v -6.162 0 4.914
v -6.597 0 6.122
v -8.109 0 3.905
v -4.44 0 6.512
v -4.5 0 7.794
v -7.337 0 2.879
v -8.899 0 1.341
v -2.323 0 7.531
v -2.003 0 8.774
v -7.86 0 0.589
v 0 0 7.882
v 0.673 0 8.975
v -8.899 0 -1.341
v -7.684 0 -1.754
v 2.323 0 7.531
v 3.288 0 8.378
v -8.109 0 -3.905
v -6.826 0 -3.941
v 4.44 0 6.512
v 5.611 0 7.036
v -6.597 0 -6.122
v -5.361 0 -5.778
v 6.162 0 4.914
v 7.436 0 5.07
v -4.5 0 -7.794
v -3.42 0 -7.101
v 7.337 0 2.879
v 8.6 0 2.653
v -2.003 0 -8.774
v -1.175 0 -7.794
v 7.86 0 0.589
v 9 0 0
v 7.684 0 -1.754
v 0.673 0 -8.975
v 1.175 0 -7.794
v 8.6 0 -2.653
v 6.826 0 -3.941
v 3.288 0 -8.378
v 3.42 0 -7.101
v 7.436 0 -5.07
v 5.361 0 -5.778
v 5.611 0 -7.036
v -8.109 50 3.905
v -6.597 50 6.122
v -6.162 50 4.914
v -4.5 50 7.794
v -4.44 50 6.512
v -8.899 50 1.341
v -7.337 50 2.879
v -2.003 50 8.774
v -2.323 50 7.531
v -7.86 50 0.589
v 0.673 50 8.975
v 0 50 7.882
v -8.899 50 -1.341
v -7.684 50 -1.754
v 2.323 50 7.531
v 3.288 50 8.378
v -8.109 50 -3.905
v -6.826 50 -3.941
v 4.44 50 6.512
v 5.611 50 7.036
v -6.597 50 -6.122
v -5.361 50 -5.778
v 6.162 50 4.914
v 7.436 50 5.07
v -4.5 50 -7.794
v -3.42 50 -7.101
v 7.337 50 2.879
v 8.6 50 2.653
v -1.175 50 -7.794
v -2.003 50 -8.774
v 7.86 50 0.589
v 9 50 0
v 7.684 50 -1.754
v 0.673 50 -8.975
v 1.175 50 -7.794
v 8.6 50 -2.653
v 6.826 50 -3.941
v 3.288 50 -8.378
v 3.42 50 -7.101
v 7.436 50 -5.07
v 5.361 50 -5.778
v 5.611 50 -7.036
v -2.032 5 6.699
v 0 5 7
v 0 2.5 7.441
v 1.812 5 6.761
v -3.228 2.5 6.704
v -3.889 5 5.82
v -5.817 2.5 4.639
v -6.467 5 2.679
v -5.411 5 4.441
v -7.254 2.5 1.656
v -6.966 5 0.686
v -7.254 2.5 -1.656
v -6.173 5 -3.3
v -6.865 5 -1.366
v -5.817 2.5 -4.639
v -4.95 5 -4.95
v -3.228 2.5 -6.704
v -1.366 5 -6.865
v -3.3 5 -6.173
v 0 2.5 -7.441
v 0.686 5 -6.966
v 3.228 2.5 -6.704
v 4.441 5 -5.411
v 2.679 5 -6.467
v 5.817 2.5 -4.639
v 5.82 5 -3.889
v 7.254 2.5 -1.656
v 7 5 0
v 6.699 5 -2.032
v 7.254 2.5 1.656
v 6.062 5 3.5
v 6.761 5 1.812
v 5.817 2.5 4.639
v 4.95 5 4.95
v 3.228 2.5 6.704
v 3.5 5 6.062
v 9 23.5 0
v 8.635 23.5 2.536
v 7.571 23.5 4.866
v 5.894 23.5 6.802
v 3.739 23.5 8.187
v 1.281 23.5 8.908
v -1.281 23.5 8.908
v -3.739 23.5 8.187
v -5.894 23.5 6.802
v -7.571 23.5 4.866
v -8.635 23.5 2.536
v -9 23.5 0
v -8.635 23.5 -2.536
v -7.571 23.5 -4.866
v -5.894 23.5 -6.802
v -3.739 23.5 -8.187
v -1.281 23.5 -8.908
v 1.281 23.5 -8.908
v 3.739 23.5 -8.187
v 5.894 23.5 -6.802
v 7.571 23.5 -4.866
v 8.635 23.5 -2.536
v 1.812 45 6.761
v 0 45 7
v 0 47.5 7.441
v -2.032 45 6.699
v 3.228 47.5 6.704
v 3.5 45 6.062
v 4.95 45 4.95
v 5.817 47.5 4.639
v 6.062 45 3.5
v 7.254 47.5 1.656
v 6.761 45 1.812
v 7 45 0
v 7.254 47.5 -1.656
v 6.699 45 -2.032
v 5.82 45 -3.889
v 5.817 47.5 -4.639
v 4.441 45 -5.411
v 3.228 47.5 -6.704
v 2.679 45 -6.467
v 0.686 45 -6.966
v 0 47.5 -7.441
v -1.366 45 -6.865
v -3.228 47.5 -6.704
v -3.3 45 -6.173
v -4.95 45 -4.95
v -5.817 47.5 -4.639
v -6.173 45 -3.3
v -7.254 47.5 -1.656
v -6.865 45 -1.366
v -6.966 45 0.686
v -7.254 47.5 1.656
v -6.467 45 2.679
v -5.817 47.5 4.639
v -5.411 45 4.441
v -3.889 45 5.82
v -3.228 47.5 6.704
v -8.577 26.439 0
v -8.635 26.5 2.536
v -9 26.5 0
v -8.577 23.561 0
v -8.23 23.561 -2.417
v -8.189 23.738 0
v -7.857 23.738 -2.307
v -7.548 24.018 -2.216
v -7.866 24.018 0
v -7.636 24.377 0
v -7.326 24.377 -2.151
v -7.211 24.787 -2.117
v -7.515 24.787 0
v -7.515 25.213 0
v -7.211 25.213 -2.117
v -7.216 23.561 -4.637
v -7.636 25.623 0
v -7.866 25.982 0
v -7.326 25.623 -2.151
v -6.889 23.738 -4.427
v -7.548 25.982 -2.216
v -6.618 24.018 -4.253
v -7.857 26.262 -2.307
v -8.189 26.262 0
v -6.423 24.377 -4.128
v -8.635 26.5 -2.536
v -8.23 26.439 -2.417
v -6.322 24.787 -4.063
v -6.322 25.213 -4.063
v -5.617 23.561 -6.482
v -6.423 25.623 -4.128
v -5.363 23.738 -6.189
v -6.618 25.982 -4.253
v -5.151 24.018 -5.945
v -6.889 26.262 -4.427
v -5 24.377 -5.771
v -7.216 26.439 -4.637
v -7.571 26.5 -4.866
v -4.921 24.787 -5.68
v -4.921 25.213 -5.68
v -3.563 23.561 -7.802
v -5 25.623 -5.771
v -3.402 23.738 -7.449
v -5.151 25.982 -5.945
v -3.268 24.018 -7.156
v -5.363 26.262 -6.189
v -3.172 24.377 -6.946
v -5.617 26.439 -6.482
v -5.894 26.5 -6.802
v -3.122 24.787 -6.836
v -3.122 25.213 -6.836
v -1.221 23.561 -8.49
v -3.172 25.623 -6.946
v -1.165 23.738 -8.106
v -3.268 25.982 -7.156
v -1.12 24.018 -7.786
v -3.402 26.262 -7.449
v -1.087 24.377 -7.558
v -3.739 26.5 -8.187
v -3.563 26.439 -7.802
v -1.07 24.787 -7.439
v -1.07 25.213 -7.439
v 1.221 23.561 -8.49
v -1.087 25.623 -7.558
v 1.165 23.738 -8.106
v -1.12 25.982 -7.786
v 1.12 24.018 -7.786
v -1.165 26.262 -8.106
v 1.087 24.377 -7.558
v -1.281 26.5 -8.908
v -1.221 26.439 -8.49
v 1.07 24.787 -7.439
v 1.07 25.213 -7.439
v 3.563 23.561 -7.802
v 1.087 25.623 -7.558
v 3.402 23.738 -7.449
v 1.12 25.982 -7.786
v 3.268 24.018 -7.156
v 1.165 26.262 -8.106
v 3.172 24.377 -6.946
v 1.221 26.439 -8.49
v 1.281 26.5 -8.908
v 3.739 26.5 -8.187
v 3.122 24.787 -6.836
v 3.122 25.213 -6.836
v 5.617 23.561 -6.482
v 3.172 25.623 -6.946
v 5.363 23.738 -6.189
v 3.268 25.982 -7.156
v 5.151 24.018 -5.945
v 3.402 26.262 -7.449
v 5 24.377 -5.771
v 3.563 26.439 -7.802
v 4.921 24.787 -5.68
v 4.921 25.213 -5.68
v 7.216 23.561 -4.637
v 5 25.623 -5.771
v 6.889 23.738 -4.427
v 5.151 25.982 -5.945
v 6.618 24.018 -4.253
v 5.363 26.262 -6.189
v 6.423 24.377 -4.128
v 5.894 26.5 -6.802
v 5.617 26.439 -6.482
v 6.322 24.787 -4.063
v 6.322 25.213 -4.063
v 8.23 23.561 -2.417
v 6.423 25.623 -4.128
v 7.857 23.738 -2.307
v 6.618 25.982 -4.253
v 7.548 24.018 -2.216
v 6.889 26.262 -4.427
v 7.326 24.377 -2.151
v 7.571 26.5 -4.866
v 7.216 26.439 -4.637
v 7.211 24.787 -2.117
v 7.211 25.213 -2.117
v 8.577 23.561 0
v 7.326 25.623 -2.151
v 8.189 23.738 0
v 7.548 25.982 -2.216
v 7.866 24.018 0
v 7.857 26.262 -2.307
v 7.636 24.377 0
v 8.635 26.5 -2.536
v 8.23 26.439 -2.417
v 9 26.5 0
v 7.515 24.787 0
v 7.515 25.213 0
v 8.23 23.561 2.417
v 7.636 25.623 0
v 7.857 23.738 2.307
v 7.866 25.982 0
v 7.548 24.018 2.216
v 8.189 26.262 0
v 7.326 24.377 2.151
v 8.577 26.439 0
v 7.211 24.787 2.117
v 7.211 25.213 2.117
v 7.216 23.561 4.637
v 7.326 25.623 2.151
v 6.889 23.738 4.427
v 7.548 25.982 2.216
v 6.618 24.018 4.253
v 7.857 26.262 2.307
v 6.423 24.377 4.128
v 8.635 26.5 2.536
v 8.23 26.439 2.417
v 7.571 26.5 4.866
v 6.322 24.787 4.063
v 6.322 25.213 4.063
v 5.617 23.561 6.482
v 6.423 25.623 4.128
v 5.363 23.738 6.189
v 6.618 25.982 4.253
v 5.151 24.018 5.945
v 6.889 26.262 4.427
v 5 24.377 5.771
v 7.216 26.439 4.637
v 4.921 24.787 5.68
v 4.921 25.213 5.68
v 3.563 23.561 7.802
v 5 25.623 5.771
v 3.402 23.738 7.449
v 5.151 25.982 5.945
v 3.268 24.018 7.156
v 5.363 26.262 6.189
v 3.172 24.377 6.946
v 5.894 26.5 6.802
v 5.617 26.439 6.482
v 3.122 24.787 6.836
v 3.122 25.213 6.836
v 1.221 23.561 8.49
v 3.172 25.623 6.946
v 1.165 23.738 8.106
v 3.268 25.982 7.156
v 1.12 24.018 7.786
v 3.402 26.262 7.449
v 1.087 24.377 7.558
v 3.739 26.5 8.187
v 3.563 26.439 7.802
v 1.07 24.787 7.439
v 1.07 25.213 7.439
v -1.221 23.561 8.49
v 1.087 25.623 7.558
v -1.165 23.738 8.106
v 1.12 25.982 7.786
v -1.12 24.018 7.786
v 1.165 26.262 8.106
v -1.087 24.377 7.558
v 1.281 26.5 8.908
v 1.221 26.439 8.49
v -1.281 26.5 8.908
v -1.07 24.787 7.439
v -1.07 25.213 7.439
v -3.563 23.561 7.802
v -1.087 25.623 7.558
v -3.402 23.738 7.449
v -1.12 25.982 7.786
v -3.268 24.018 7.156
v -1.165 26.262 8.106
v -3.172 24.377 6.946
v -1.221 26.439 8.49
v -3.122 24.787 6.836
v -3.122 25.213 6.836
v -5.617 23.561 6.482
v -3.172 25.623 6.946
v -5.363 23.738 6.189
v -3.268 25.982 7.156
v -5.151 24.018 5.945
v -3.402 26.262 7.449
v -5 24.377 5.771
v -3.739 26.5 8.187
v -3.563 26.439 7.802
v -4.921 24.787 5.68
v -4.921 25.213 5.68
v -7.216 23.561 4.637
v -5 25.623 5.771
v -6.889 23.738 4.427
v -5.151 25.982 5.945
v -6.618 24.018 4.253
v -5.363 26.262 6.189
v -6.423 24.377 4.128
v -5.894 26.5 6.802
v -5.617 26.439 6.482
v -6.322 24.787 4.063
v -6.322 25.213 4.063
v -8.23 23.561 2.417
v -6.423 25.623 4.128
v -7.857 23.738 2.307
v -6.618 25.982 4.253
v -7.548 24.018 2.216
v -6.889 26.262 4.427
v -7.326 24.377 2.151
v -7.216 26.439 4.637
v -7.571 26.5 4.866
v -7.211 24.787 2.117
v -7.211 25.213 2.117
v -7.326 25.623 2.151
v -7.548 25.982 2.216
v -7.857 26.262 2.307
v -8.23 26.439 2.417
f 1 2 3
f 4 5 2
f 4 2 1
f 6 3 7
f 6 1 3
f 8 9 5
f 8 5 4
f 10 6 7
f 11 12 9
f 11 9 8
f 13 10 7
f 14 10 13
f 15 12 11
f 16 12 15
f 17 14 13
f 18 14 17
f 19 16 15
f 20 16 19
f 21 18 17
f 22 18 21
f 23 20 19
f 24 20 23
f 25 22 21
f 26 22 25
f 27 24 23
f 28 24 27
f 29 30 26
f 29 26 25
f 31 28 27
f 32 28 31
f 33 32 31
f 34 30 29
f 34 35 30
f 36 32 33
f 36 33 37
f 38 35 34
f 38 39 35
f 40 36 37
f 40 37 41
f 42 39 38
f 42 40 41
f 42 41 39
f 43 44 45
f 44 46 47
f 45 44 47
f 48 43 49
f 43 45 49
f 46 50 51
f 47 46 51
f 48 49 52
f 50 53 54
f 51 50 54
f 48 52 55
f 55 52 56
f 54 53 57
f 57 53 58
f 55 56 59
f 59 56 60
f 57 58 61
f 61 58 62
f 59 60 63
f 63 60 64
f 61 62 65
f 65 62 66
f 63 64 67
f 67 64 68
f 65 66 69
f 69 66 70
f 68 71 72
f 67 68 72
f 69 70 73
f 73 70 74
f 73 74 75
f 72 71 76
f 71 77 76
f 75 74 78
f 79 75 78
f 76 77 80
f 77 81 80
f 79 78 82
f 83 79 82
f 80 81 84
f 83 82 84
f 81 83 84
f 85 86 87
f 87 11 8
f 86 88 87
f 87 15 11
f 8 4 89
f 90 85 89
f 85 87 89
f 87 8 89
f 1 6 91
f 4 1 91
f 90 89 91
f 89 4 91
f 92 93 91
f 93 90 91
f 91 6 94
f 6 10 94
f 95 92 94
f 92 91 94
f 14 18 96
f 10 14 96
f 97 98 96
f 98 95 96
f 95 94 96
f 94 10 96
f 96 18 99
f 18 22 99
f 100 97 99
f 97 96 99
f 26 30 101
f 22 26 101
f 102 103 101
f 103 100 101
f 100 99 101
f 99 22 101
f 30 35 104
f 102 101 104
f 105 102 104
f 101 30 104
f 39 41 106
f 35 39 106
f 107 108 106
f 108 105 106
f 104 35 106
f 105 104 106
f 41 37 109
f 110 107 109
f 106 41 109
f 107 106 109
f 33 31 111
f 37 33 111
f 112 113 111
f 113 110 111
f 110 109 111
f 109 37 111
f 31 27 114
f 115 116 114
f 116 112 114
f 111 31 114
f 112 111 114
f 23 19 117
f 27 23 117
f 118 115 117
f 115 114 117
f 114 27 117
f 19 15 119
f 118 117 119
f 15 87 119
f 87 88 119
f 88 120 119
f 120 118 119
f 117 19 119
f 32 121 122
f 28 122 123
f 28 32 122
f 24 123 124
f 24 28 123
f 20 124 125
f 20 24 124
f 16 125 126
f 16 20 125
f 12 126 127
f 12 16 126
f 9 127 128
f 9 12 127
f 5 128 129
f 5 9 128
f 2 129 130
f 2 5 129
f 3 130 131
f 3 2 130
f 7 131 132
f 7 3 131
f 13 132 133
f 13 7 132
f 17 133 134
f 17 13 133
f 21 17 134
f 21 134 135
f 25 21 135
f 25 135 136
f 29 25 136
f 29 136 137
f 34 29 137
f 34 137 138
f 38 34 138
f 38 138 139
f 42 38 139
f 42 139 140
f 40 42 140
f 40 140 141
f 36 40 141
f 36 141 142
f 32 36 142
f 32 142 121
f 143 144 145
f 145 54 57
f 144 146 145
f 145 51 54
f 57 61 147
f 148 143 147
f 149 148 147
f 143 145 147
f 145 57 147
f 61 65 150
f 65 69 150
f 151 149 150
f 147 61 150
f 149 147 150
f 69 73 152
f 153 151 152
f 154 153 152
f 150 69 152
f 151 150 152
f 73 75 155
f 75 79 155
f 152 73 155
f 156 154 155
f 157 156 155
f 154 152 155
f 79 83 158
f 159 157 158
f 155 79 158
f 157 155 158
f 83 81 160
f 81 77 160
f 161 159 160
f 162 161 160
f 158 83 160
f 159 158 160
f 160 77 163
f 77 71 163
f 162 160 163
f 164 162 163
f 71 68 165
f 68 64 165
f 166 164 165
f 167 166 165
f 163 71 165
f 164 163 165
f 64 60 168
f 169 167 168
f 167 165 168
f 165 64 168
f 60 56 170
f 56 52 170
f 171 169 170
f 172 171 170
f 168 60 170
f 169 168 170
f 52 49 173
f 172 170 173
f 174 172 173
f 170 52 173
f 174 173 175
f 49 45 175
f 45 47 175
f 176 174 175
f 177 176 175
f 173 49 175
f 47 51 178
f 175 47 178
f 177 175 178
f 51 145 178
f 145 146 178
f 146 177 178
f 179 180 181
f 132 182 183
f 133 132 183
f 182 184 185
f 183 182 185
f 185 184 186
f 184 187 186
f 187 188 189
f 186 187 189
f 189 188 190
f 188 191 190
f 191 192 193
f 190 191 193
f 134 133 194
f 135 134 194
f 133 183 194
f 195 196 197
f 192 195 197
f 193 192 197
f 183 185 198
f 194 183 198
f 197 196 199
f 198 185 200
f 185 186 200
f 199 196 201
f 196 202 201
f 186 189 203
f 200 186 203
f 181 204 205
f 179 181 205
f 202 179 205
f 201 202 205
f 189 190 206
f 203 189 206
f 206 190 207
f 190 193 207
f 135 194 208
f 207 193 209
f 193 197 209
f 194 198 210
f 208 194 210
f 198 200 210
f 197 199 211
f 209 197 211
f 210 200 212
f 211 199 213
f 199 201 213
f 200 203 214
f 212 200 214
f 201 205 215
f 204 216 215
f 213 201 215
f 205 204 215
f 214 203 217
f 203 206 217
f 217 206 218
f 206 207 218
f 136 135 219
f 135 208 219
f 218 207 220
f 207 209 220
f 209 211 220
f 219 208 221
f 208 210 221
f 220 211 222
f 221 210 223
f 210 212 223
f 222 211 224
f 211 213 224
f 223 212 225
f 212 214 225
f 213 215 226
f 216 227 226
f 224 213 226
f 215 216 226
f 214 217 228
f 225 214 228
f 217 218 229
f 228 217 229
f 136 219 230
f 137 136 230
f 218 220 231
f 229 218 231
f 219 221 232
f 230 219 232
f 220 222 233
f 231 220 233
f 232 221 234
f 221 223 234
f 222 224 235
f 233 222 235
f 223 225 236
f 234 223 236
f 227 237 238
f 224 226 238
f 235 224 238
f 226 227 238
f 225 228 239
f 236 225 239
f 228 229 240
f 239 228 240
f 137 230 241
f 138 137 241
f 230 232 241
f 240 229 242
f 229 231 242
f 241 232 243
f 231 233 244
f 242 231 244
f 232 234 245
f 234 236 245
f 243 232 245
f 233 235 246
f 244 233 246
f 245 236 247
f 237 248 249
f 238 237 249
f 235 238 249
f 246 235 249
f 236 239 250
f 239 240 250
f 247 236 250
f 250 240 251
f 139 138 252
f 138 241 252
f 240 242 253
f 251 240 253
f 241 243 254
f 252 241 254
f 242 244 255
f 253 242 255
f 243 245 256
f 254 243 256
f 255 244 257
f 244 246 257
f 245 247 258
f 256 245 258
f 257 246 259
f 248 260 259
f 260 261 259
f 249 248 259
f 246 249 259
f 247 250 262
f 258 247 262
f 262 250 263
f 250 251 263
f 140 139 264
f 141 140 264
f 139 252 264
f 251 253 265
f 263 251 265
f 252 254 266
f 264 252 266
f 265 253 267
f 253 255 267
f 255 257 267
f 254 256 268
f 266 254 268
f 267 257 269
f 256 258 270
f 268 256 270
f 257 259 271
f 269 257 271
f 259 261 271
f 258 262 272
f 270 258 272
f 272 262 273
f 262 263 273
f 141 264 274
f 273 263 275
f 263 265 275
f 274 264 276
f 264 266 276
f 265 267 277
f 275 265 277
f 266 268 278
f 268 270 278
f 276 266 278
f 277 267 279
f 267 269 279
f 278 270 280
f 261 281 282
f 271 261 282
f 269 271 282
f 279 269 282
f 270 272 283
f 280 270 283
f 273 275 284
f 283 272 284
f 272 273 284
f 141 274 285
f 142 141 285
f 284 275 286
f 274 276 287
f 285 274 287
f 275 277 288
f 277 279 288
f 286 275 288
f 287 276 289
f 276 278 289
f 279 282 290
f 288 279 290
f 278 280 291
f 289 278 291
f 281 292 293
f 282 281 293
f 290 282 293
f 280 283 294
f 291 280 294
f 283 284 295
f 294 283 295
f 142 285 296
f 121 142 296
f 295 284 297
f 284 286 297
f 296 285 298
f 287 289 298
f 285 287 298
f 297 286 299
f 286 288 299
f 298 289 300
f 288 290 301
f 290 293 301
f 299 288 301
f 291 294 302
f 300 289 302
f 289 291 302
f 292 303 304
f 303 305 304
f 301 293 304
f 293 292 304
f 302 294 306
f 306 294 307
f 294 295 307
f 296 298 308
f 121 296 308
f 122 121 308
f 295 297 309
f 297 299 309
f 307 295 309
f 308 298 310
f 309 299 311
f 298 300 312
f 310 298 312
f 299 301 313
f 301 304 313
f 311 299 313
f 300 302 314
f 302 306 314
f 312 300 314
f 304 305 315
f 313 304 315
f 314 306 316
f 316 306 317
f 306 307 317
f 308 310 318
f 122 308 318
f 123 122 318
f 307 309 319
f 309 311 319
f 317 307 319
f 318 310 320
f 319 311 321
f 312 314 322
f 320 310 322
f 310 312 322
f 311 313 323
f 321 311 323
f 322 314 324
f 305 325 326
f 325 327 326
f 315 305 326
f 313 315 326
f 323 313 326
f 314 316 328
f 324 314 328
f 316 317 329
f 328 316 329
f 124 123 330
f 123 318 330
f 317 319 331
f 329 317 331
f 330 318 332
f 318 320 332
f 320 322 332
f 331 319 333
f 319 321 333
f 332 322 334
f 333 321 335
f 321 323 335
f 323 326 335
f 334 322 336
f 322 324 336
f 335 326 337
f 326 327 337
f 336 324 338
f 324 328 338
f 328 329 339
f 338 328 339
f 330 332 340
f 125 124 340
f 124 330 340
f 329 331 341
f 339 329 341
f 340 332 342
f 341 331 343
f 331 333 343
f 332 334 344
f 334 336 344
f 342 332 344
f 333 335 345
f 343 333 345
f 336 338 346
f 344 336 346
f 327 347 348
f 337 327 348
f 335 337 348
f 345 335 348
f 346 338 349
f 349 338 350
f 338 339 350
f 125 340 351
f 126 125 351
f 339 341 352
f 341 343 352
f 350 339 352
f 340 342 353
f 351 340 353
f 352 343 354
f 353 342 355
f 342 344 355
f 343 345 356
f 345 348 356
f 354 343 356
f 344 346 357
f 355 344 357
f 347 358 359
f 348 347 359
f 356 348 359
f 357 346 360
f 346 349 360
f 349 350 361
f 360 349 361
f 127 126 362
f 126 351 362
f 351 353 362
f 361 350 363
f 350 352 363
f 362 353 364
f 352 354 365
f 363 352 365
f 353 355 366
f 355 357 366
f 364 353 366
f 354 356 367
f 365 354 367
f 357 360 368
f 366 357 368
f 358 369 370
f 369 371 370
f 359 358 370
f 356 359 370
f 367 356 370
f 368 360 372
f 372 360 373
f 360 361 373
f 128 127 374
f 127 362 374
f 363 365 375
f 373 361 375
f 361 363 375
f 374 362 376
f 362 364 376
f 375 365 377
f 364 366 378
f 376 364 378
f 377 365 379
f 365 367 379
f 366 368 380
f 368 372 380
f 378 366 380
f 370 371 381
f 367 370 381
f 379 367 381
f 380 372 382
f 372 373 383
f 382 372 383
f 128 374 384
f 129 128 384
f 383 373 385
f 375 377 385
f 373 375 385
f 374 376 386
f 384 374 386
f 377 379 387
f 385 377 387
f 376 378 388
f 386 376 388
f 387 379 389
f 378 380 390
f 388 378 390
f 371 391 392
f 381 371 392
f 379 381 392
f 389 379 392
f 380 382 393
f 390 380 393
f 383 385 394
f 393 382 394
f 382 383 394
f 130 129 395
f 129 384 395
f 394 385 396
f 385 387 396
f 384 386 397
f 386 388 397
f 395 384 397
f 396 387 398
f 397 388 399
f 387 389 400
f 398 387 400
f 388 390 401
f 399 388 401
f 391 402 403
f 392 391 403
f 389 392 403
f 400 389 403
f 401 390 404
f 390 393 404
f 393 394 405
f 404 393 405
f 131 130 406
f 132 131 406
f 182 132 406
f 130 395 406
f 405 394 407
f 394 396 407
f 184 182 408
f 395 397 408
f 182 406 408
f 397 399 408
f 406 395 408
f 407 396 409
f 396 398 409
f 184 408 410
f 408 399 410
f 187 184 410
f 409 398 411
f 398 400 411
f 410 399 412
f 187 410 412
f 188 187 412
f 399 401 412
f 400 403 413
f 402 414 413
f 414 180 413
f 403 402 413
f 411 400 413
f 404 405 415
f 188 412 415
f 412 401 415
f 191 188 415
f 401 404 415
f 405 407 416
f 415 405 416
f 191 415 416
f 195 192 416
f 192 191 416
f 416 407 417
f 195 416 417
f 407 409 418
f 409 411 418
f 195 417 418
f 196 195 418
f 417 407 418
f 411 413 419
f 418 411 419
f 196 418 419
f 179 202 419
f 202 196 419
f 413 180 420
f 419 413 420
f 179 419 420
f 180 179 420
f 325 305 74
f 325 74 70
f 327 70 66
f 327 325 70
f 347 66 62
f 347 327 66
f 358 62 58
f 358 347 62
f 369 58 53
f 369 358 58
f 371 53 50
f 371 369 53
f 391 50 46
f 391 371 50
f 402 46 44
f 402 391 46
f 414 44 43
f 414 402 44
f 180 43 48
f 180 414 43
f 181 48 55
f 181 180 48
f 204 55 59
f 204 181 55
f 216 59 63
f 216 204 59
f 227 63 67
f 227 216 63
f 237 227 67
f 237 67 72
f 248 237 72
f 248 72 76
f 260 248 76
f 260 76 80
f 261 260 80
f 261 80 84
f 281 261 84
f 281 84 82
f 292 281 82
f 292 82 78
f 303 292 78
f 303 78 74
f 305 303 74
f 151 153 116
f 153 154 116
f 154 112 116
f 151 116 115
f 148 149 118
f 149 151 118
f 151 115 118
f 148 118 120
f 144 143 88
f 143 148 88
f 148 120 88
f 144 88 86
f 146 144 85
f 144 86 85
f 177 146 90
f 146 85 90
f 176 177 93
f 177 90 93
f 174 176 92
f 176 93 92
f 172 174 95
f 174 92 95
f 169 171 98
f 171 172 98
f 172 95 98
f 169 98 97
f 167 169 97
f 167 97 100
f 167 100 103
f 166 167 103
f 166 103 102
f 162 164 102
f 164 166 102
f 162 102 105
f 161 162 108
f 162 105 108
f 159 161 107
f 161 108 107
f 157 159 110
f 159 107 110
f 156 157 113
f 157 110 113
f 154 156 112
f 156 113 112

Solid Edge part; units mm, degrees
sketch "Sketch1" plane through (0, 0, 0) normal (0, -1, 0) x (1, 0, 0)
  circle A0 centre (0, 0) radius 9
  circle A1 centre (0, 0) radius 7
  dimension "D1" = 18
  dimension "D2" = 14
extrude "Protrusion1" add sketch "Sketch1" against normal blind 50
sketch "Sketch2" plane through (0, 0, 0) normal (0, 0, 1) x (1, 0, 0)
  arc A0 (-9, 23.5) -> (-7.5, 25) centre (-9, 25) ccw
  arc A1 (-7.5, 25) -> (-9, 26.5) centre (-9, 25) ccw
  line L0 (-9, 26.5) -> (-9, 23.5)
revolve "RevolvedCutout1" cut sketch "Sketch2" angle 360 about axis through (0, 52.7188, 0) along (0, -1, 0)
sketch "Sketch3" plane through (0, 0, 0) normal (1, 0, 0) x (0, 1, 0)
  line L0 (0, 7) -> (0, 7.8816)
  line L1 (0, 7.8816) -> (5, 7)
  line L2 (5, 7) -> (0, 7)
  line L3 (50, 7) -> (50, 7.8816)
  line L4 (50, 7.8816) -> (45, 7)
  line L5 (45, 7) -> (50, 7)
  dimension "D1" = 5
revolve "RevolvedCutout2" cut sketch "Sketch3" angle 360 about axis through (0, 0, 0) along (0, 1, 0)
